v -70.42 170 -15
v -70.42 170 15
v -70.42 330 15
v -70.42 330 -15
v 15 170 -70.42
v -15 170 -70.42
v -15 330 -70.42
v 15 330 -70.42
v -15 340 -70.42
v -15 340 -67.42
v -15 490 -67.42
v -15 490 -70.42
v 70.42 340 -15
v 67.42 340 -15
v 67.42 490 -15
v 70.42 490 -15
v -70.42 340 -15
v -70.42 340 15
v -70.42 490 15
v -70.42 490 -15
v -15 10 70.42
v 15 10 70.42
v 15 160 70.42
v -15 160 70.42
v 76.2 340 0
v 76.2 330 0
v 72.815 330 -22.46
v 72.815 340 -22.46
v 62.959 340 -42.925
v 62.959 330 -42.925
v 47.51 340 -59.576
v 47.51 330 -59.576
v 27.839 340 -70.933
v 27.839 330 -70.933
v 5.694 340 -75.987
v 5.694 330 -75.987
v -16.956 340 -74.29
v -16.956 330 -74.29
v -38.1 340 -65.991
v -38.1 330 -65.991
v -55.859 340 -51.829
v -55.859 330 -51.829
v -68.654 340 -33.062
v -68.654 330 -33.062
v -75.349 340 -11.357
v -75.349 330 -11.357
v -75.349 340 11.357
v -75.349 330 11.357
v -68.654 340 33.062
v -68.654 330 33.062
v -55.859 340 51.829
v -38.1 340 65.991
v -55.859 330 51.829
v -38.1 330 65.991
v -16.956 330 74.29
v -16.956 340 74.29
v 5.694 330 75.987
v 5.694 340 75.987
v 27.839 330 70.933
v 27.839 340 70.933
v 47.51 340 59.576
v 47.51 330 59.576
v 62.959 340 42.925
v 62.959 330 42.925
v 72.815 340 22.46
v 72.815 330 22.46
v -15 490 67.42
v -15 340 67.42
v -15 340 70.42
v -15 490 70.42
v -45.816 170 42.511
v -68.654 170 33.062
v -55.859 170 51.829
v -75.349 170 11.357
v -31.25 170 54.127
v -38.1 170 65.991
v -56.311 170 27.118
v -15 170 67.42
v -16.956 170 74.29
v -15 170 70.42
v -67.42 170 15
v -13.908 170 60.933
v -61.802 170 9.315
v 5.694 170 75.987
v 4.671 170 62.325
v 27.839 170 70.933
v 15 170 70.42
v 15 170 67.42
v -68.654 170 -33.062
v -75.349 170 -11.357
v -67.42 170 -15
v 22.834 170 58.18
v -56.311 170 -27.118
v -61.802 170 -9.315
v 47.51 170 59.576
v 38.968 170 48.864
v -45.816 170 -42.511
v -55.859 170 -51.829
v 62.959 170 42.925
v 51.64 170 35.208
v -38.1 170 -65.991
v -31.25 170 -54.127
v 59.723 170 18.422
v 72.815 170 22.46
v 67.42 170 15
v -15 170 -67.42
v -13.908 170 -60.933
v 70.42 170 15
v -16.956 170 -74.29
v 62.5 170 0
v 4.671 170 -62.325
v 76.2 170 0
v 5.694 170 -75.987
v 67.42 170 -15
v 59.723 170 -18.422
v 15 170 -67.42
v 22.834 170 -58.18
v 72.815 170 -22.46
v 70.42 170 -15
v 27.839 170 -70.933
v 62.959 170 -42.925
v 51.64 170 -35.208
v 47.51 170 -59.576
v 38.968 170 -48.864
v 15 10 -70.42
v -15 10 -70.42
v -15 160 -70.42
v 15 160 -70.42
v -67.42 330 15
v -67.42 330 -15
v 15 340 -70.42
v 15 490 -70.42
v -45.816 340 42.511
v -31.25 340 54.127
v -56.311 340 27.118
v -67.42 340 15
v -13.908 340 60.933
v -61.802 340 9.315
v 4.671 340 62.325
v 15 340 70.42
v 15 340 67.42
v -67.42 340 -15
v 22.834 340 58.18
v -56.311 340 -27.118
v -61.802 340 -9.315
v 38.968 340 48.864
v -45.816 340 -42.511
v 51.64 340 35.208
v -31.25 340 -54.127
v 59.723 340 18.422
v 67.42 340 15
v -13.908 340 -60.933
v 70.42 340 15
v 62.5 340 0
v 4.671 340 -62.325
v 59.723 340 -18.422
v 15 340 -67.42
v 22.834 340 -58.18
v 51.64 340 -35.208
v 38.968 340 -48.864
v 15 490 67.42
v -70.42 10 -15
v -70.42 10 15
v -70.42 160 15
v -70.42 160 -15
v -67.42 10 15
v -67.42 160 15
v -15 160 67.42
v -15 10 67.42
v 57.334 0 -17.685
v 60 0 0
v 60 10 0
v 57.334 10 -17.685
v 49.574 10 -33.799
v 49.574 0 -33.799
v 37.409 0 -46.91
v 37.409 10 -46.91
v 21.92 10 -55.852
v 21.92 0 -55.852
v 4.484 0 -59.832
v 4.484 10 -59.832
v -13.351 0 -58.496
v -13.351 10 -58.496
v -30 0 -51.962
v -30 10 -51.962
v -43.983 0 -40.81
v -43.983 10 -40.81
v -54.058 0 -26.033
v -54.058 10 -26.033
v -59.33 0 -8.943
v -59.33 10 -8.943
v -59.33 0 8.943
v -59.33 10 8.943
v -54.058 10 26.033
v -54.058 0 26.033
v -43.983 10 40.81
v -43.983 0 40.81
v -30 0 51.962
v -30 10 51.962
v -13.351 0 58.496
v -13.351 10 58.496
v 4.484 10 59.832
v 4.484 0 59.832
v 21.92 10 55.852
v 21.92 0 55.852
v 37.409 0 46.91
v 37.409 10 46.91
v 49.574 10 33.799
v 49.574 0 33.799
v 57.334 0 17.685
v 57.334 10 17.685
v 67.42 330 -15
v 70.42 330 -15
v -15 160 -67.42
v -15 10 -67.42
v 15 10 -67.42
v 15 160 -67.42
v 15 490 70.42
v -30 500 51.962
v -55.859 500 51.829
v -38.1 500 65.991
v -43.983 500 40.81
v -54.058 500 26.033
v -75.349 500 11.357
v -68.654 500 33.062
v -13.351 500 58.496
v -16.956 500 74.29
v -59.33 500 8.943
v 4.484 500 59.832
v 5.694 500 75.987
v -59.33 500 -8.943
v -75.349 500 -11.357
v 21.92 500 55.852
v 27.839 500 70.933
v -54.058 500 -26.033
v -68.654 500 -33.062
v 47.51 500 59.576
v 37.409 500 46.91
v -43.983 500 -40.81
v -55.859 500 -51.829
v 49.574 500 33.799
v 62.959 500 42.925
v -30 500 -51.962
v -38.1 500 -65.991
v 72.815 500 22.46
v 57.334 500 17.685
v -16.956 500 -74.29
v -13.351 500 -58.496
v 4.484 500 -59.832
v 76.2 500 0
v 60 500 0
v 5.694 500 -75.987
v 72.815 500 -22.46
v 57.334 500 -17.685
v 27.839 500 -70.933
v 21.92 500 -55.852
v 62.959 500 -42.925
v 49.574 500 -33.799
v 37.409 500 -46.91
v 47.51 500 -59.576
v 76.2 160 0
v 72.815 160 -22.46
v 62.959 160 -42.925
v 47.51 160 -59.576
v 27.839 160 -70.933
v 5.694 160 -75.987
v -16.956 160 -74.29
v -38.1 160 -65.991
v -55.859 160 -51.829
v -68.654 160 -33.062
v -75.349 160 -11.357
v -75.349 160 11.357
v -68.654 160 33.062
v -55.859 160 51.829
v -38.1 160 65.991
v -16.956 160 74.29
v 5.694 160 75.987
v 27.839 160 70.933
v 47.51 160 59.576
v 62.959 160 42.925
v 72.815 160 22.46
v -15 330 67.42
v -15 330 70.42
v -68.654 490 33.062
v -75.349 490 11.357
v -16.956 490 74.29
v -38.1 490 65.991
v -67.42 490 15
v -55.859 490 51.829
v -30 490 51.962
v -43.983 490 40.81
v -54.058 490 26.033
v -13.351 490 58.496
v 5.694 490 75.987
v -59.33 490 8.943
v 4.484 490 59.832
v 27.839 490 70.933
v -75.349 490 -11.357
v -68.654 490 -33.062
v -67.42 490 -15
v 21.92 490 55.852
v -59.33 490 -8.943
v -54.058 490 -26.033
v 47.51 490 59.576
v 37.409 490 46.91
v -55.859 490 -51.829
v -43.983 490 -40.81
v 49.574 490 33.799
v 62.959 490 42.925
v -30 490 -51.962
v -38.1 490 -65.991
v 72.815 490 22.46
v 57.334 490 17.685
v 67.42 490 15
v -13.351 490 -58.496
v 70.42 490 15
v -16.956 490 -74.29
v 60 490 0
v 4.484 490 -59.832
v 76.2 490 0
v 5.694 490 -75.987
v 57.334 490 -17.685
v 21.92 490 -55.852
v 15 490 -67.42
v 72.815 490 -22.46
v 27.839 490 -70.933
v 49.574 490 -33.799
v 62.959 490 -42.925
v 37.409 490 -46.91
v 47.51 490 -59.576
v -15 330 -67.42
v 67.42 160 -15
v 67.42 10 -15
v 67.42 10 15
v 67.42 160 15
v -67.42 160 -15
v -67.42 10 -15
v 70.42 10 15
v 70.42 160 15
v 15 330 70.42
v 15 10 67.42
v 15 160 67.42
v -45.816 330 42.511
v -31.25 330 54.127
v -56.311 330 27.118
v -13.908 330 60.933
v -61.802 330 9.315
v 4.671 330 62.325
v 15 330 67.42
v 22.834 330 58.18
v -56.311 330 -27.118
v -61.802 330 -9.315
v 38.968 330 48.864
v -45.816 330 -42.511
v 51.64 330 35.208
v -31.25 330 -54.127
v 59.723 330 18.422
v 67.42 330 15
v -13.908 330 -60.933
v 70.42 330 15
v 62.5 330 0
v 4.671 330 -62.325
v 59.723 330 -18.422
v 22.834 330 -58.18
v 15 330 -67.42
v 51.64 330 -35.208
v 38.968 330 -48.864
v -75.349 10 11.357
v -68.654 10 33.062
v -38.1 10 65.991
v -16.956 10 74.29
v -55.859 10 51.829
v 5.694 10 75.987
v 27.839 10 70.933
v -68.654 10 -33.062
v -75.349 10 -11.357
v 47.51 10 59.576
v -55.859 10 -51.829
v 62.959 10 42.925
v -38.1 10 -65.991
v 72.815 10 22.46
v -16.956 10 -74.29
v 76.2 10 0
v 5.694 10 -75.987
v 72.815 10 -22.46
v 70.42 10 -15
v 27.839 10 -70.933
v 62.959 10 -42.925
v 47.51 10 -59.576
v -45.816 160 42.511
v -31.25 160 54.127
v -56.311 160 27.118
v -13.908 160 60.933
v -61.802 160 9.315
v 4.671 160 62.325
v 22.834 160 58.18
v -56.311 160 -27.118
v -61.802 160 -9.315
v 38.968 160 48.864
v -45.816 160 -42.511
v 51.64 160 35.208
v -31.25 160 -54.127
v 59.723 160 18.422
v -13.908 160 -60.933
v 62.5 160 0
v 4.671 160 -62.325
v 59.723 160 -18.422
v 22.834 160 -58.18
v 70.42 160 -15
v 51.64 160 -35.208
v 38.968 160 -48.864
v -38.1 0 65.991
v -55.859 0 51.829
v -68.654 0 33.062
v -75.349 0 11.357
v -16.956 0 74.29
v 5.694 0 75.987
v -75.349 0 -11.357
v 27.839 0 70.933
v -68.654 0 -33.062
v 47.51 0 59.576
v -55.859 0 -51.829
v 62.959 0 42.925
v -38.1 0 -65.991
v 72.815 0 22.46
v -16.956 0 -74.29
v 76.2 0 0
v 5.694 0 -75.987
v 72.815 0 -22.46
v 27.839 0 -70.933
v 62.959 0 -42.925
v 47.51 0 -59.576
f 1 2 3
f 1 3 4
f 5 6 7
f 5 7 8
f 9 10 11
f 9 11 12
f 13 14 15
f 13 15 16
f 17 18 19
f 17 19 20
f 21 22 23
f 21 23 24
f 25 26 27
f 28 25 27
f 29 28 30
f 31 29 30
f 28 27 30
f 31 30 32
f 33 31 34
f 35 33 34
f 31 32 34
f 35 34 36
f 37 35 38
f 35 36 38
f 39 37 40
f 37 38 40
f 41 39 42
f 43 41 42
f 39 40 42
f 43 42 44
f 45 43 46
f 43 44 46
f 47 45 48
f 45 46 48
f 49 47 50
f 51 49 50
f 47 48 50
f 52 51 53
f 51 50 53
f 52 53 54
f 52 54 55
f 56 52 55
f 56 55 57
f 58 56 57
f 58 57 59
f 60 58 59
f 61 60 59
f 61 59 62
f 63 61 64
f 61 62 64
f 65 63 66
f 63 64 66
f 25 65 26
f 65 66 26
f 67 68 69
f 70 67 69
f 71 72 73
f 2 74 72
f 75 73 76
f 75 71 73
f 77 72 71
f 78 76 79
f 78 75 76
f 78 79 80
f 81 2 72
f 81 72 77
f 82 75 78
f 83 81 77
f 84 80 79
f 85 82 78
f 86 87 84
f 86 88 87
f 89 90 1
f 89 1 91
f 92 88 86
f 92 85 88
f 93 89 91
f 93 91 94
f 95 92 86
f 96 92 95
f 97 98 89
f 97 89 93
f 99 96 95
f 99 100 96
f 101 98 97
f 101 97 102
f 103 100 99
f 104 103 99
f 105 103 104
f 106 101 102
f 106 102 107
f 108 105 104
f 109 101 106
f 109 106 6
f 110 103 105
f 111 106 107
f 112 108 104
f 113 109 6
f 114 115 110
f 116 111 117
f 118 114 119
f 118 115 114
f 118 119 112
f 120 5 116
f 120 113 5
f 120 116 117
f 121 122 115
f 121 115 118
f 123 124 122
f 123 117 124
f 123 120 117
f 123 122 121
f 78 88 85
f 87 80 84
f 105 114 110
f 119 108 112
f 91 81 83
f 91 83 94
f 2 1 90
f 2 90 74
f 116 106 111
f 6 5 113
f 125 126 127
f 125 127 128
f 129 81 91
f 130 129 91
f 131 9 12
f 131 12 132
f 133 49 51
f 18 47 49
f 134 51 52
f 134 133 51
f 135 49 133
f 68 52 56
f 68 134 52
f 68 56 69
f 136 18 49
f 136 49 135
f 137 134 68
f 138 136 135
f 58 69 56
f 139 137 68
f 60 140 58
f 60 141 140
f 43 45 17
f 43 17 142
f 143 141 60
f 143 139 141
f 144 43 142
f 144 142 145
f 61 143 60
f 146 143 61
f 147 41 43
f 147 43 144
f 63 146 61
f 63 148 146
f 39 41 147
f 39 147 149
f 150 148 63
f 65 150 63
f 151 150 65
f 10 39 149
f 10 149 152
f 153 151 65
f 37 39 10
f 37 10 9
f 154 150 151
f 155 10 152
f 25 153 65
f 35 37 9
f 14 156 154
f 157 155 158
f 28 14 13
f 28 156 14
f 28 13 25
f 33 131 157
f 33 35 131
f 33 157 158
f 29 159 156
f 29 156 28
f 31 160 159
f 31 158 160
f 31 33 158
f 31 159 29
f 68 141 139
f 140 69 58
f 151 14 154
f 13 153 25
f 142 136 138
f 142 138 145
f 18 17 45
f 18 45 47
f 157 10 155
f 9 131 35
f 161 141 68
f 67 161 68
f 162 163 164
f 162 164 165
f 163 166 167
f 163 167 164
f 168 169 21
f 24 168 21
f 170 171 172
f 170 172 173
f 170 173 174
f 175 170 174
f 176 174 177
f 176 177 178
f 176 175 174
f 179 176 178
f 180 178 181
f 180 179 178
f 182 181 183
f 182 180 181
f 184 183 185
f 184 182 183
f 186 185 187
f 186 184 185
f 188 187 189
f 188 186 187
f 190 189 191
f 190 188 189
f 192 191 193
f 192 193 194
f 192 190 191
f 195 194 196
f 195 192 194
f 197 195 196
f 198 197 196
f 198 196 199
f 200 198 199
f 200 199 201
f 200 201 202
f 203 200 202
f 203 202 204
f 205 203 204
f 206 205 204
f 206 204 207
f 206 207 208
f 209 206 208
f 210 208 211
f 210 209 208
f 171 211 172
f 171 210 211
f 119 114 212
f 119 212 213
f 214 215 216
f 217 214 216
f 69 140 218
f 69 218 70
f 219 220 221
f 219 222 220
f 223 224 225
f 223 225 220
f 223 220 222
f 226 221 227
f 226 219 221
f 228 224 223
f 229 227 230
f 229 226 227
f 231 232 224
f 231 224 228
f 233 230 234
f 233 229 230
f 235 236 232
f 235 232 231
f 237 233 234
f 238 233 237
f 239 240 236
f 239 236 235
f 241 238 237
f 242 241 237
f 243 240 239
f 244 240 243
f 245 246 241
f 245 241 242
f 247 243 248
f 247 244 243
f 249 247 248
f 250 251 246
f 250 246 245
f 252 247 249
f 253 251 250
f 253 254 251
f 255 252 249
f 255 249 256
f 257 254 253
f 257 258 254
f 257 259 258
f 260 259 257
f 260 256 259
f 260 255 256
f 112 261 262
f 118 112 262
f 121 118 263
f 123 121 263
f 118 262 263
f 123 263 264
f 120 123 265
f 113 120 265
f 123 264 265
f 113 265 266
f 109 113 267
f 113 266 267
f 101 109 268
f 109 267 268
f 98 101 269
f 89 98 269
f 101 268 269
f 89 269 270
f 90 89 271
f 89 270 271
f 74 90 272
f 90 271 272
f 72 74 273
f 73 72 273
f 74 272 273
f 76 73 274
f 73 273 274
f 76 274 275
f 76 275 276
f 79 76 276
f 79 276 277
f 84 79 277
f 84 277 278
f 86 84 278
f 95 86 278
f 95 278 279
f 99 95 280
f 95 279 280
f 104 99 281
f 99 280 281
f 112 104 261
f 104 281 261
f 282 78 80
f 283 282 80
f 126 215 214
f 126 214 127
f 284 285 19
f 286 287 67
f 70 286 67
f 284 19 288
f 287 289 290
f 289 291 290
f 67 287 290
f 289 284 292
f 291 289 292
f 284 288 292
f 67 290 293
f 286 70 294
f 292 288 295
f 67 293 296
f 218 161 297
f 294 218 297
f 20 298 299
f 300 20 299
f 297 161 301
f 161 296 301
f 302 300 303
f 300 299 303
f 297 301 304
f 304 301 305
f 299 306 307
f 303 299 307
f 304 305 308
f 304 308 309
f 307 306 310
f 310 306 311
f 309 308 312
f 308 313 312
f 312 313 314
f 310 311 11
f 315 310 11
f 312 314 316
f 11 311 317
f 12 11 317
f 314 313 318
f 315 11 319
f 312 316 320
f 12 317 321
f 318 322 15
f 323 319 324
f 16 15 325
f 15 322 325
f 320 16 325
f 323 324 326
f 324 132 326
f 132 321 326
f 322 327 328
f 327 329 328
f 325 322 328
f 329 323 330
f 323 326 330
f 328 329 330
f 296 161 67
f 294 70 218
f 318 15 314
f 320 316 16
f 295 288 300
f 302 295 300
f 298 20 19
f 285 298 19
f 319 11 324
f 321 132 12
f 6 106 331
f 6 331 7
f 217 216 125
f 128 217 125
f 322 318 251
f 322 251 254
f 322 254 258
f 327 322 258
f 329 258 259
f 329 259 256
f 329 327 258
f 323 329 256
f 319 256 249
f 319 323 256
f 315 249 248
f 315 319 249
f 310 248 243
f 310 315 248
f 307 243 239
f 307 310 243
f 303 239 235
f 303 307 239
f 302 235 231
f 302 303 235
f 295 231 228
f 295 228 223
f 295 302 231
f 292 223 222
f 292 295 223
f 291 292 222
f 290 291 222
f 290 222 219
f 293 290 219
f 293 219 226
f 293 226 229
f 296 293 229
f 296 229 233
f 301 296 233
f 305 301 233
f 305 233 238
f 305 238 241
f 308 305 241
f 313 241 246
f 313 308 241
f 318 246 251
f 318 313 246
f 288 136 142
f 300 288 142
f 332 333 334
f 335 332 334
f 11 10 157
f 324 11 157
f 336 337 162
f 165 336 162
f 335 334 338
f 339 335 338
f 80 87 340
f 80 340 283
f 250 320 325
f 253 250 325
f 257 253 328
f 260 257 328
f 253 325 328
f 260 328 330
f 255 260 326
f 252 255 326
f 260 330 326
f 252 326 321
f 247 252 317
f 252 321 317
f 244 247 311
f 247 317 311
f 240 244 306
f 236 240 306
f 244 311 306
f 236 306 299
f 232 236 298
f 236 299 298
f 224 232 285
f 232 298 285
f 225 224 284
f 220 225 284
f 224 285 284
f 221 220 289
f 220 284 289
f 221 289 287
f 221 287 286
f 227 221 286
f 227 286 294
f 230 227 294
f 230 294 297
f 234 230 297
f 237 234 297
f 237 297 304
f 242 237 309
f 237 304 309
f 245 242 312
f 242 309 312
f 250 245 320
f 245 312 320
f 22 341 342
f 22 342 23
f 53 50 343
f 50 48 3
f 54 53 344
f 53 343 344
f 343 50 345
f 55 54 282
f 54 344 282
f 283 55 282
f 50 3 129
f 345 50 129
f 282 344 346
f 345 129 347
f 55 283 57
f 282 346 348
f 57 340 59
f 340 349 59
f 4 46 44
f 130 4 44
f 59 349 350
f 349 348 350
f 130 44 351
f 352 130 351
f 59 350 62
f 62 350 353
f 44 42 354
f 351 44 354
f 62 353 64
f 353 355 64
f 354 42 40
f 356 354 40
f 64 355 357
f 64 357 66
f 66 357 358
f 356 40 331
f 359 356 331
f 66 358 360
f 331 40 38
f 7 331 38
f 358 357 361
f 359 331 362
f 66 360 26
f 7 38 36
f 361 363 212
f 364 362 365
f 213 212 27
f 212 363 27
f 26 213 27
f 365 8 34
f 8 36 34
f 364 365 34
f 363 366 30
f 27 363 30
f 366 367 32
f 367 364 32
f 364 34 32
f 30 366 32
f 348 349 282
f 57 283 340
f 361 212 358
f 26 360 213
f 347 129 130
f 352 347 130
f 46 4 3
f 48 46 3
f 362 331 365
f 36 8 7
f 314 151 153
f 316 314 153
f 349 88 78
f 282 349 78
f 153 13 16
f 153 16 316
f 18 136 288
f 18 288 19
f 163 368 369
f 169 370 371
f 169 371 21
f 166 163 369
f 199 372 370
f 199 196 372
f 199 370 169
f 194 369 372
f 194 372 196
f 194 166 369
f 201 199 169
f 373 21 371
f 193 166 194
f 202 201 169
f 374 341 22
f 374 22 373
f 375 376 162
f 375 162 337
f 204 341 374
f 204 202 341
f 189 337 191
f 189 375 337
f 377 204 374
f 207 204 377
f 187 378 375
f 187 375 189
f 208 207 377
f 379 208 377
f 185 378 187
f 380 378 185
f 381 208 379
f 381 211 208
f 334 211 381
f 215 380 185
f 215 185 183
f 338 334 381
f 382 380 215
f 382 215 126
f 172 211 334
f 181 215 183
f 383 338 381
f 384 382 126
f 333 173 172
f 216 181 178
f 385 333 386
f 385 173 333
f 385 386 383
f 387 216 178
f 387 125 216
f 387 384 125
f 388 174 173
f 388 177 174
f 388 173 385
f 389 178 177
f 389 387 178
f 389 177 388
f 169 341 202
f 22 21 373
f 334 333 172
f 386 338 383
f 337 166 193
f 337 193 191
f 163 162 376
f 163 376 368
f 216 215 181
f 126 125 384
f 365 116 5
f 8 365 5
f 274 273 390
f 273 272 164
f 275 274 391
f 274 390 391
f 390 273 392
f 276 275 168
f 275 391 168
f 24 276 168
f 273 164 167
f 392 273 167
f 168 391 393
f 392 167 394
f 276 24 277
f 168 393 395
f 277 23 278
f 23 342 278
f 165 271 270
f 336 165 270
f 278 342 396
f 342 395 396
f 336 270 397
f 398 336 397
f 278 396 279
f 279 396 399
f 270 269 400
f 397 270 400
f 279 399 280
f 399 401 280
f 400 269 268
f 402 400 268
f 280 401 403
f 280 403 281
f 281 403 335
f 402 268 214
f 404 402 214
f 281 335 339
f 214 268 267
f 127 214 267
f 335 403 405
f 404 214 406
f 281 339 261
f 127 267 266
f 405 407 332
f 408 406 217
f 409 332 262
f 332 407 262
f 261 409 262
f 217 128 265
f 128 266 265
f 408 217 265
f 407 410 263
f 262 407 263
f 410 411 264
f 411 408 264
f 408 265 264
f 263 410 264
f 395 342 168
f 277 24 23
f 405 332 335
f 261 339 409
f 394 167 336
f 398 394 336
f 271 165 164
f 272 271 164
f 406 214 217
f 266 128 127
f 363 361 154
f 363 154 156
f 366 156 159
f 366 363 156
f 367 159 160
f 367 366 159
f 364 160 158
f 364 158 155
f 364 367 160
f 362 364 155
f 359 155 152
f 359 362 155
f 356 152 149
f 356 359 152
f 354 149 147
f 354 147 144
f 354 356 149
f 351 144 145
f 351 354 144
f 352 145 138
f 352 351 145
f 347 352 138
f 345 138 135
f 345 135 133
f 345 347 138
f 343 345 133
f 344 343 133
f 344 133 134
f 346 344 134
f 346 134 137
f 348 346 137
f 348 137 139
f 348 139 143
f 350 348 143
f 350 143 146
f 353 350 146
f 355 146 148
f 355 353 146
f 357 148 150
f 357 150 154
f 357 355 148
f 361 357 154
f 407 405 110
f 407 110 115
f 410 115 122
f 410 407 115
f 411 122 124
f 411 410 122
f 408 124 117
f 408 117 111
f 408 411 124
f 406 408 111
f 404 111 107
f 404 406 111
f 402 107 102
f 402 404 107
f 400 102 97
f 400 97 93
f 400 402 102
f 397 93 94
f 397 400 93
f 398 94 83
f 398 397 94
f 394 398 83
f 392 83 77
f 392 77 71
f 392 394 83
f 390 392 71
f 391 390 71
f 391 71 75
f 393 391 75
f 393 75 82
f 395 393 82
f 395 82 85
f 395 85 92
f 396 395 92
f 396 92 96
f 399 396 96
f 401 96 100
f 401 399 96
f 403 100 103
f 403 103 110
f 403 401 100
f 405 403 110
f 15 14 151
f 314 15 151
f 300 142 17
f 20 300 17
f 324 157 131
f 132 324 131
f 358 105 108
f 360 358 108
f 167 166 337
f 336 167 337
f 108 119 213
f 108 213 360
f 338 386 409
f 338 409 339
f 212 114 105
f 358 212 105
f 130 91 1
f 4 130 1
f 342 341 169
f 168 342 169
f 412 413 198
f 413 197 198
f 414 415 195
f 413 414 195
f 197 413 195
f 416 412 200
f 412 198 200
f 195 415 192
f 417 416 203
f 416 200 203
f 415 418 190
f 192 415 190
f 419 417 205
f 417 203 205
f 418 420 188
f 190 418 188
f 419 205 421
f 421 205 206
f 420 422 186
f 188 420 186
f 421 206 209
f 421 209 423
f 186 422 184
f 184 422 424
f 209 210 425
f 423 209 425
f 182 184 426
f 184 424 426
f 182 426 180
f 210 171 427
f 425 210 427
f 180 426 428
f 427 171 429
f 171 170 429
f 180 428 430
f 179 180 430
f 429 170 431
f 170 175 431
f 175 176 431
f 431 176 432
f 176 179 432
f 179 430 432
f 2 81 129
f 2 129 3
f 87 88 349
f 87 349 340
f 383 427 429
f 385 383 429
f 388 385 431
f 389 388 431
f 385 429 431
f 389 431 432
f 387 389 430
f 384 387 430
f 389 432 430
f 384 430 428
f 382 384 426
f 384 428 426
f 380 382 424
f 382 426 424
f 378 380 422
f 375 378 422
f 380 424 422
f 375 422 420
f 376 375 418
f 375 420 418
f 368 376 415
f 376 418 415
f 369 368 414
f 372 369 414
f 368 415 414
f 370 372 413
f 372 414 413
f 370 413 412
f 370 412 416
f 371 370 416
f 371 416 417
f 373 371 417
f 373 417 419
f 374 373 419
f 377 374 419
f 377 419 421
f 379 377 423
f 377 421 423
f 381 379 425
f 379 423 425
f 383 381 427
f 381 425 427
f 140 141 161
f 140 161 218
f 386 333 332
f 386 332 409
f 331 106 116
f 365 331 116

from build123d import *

# Parameters (mm, degrees)
ESQUISSE1_R                  = 76.2
ESQUISSE1_R_2                = 60
BOSS_EXTRU_1_DEPTH           = 10
ESQUISSE2_W                  = 30
ESQUISSE2_H                  = 3
BOSS_EXTRU_2_DEPTH           = 480
R_P_TITION_CIRCULAIRE1_COUNT = 4
R_P_TITION_LIN_AIRE1_COUNT   = 2
R_P_TITION_LIN_AIRE1_PITCH   = 490
ESQUISSE5_R                  = 76.2
ESQUISSE5_R_2                = 62.5
BOSS_EXTRU_3_DEPTH           = 10
R_P_TITION_LIN_AIRE2_COUNT   = 2
R_P_TITION_LIN_AIRE2_PITCH   = 170


with BuildPart() as part:
    # Esquisse1 → Boss.-Extru.1 (new body)
    with BuildSketch(Plane(origin=(0, 0, 0), x_dir=(1, 0, 0), z_dir=(0, 1, 0))):
        Circle(ESQUISSE1_R)
        Circle(ESQUISSE1_R_2, mode=Mode.SUBTRACT)
    boss_extru_1 = extrude(amount=BOSS_EXTRU_1_DEPTH)

    # Esquisse2 → Boss.-Extru.2 (add)
    with BuildSketch(Plane(origin=(0, 10, 0), x_dir=(1, 0, 0), z_dir=(0, 1, 0))):
        with Locations((0, 68.920167566)):
            Rectangle(ESQUISSE2_W, ESQUISSE2_H)
    boss_extru_2 = extrude(amount=BOSS_EXTRU_2_DEPTH)

    # Répétition circulaire1: Boss.-Extru.2 ×4 about axis
    r_p_tition_circulaire1_axis = Axis((0, 0, 0), (0, 1, 0))
    for i in range(1, R_P_TITION_CIRCULAIRE1_COUNT):
        add(boss_extru_2.rotate(r_p_tition_circulaire1_axis, i * 360 / R_P_TITION_CIRCULAIRE1_COUNT))

    # Répétition linéaire1: Boss.-Extru.1 ×2
    with Locations(*[(0, i * R_P_TITION_LIN_AIRE1_PITCH, 0) for i in range(1, R_P_TITION_LIN_AIRE1_COUNT)]):
        add(boss_extru_1)

    # Esquisse5 → Boss.-Extru.3 (add)
    with BuildSketch(Plane(origin=(0, 160, 0), x_dir=(1, 0, 0), z_dir=(0, 1, 0))):
        Circle(ESQUISSE5_R)
        Circle(ESQUISSE5_R_2, mode=Mode.SUBTRACT)
    boss_extru_3 = extrude(amount=BOSS_EXTRU_3_DEPTH)

    # Répétition linéaire2: Boss.-Extru.3 ×2
    with Locations(*[(0, i * R_P_TITION_LIN_AIRE2_PITCH, 0) for i in range(1, R_P_TITION_LIN_AIRE2_COUNT)]):
        add(boss_extru_3)


solid = part.part
